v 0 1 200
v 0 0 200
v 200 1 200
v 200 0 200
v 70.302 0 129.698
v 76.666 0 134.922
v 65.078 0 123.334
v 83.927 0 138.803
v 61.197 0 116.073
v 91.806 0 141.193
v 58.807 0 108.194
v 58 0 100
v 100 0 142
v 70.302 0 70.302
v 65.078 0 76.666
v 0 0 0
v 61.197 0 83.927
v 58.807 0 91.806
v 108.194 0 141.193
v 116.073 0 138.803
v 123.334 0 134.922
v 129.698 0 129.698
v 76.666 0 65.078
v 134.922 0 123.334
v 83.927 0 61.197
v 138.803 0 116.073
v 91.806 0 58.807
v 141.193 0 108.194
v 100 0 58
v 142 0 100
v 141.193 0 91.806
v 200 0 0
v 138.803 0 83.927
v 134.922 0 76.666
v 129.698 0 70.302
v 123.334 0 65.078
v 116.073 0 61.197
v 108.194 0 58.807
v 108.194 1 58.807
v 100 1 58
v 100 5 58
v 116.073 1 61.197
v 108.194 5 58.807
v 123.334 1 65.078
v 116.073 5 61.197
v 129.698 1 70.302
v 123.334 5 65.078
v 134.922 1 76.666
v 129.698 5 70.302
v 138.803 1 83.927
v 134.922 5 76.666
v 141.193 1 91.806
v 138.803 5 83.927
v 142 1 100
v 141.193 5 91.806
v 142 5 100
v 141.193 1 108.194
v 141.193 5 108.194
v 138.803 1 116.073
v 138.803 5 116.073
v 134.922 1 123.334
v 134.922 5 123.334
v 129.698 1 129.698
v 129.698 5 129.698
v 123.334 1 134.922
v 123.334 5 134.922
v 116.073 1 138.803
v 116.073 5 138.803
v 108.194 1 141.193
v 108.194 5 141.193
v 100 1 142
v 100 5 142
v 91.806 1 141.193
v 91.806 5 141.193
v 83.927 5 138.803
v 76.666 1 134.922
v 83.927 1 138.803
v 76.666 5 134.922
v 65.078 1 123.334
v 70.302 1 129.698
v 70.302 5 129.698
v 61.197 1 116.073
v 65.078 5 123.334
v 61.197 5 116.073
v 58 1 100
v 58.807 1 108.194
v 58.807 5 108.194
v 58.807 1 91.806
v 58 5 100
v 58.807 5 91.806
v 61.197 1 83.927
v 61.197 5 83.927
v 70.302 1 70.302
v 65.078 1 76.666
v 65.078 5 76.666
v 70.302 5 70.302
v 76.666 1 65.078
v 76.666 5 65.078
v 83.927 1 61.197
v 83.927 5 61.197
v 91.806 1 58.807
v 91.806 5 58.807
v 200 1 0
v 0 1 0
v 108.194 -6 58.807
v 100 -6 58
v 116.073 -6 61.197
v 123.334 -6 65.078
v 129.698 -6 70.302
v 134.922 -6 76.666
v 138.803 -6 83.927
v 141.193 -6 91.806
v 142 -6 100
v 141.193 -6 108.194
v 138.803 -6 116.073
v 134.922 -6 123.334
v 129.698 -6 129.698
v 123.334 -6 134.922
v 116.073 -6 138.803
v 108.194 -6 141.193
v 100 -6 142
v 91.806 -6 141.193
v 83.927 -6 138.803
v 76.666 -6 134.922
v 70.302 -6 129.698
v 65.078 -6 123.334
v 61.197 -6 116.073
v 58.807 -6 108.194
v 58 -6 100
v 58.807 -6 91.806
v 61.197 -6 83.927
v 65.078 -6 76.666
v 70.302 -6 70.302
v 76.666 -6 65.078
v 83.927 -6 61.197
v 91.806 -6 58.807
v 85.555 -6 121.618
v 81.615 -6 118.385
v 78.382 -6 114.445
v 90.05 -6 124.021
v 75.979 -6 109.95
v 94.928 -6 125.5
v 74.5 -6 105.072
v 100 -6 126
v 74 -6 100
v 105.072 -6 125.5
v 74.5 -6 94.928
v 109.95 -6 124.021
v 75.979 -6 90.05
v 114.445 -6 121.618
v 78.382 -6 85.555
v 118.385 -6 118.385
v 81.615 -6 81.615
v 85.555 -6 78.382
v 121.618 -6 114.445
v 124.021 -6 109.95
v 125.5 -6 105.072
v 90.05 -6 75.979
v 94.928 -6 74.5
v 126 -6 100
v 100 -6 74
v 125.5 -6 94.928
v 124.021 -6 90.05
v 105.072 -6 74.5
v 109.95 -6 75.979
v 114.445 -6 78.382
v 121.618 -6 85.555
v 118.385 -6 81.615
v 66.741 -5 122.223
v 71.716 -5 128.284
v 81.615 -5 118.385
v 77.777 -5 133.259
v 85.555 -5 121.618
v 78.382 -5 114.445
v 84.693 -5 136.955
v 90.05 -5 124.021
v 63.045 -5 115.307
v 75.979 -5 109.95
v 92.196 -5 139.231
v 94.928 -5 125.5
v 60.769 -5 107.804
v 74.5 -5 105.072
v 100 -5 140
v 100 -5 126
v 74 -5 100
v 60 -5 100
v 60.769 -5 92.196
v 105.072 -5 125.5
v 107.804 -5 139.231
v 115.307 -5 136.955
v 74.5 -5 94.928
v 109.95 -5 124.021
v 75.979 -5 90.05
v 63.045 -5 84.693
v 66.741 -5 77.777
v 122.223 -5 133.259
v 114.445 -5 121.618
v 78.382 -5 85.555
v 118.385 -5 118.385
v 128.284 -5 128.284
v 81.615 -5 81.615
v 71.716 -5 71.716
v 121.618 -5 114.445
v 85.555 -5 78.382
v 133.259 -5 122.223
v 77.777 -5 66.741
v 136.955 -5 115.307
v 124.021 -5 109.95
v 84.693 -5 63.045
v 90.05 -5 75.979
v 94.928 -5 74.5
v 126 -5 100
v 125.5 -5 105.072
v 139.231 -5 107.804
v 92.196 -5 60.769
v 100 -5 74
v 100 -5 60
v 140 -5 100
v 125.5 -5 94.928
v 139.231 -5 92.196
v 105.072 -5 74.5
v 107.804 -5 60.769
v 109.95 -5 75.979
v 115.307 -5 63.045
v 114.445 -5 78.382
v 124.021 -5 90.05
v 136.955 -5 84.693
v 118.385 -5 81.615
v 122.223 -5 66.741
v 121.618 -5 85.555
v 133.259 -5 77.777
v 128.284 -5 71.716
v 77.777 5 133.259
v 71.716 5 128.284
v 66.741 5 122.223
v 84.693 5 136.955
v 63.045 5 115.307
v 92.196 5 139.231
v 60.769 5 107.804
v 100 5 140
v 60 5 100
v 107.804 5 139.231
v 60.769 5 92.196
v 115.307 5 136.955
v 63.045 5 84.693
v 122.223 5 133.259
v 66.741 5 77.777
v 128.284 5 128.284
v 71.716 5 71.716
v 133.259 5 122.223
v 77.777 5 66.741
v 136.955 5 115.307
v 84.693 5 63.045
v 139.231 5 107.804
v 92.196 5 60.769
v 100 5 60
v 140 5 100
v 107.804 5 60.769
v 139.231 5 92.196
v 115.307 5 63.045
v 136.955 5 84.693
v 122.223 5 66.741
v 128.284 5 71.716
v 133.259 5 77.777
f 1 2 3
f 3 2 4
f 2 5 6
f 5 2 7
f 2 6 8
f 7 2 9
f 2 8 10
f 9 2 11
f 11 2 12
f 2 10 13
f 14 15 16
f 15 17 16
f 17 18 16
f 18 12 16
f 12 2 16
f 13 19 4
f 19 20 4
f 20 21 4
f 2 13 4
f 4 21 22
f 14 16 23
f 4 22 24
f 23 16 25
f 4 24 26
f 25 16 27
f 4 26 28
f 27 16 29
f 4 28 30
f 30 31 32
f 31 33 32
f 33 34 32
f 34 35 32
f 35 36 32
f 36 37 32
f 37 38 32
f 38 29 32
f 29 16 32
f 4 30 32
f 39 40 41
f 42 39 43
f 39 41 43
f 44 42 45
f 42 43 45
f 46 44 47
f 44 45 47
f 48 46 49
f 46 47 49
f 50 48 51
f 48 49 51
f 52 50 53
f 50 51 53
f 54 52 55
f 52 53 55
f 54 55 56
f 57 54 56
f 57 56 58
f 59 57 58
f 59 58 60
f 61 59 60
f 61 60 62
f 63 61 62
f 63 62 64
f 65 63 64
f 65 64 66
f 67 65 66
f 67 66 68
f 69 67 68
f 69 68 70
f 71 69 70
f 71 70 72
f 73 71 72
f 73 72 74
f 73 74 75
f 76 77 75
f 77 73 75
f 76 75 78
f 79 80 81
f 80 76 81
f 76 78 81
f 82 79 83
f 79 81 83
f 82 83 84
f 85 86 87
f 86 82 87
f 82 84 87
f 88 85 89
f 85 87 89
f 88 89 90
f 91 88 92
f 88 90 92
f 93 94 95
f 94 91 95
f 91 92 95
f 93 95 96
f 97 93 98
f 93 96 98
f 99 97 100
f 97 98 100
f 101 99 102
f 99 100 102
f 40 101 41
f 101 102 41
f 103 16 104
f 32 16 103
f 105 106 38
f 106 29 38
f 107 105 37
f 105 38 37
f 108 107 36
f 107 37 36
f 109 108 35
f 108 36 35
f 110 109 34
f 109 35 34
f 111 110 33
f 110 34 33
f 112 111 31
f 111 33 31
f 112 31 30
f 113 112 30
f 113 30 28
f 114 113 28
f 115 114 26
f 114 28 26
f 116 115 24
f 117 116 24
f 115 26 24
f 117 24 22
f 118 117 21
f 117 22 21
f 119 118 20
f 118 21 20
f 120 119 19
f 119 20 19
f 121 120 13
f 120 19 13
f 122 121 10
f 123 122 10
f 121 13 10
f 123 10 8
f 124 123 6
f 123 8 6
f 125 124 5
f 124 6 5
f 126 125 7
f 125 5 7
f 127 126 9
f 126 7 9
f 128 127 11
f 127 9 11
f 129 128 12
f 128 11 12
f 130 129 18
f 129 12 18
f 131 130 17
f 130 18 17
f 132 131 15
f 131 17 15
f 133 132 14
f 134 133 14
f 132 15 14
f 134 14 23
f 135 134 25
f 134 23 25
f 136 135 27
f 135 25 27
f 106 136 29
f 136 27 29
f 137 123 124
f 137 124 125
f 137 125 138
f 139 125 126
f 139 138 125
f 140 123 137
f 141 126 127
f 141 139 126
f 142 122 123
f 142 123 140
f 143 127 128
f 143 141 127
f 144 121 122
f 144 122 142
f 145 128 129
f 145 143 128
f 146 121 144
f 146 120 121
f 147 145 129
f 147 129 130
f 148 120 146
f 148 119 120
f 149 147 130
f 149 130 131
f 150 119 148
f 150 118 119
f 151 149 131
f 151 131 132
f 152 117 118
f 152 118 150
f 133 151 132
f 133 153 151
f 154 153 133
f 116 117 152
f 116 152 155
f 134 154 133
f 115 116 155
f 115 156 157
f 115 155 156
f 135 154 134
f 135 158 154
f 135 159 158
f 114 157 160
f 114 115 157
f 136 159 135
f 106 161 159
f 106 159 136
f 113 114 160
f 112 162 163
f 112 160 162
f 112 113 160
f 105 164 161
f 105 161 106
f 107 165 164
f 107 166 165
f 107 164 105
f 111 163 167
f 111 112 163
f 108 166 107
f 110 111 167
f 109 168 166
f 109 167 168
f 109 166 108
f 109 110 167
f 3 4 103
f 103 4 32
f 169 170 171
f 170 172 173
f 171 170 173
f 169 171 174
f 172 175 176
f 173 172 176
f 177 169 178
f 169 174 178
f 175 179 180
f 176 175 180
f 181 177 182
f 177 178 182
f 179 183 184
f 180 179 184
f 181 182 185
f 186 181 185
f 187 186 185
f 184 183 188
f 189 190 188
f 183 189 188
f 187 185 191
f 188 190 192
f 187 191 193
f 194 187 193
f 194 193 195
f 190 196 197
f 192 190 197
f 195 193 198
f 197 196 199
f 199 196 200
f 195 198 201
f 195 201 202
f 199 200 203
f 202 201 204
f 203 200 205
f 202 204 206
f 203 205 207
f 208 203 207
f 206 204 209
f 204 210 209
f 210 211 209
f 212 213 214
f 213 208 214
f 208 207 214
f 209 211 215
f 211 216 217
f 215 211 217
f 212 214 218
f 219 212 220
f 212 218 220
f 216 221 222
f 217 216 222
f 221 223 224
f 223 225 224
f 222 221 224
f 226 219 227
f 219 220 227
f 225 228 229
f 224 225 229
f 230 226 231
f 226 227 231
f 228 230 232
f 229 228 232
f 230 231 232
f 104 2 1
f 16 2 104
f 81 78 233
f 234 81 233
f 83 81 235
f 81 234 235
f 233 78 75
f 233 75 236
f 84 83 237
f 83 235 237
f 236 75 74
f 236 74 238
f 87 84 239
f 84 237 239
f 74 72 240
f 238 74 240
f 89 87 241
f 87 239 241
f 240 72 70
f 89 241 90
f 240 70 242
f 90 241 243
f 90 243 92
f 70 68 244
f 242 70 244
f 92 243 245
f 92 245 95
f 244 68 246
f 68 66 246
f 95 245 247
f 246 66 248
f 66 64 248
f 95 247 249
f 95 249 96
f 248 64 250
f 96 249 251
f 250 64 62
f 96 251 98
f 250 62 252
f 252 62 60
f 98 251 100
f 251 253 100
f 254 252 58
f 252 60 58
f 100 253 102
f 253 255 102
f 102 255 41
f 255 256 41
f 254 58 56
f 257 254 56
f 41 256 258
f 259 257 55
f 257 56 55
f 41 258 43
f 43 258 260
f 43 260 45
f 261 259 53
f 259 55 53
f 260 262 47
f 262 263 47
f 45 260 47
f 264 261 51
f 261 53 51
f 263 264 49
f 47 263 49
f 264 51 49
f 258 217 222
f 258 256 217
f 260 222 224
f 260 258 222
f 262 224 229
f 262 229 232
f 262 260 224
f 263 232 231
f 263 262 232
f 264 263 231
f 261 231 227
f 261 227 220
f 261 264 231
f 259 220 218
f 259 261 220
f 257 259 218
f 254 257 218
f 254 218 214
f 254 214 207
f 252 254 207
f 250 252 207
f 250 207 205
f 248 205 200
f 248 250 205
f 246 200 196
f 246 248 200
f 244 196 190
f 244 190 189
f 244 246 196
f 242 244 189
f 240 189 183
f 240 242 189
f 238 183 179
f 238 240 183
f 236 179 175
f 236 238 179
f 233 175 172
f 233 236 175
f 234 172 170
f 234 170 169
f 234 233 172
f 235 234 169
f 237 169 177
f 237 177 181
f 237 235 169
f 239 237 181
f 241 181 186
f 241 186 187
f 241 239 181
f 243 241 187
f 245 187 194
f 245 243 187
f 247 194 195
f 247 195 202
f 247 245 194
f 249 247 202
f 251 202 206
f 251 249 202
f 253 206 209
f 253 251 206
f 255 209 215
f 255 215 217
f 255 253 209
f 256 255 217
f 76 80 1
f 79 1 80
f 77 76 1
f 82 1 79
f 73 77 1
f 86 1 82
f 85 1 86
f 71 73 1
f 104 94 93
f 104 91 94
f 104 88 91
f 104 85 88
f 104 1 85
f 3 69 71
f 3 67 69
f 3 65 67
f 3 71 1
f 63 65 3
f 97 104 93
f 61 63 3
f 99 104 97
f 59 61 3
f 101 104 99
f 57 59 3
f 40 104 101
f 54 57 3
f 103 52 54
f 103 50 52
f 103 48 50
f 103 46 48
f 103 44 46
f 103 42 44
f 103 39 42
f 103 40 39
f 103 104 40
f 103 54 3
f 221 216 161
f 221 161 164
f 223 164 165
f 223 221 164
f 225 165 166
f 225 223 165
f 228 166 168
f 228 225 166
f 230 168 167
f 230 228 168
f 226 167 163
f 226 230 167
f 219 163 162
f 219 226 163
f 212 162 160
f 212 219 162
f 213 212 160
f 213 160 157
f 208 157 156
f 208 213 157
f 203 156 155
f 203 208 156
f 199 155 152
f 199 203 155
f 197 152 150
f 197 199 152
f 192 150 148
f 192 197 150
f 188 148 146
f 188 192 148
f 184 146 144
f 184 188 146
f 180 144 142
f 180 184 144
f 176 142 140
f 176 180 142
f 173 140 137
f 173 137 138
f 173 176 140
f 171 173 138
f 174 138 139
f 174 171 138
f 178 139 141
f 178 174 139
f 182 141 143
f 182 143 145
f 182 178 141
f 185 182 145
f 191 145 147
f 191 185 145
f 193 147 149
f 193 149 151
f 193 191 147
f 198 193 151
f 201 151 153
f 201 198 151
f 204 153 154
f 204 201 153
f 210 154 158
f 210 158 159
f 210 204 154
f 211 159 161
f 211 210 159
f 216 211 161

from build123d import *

# Parameters (mm, degrees)
SKETCH1_W                = 200
SKETCH1_H                = 200
BOSS_EXTRUDE3_DEPTH      = 1
SKETCH10_R               = 40
CUT_EXTRUDE2_DEPTH       = 1
BOSS_EXTRUDE6_DEPTH      = 5
BOSS_EXTRUDE6_DEPTH_BACK = 5
SKETCH13_R               = 42
SKETCH13_R_2             = 40
SKETCH14_R               = 42
SKETCH14_R_2             = 26
BOSS_EXTRUDE7_DEPTH      = 1


with BuildPart() as part:
    # Sketch1 → Boss-Extrude3 (new body)
    with BuildSketch(Plane(origin=(0, 0, 0), x_dir=(1, 0, 0), z_dir=(0, 1, 0))):
        with Locations((100, -100)):
            Rectangle(SKETCH1_W, SKETCH1_H)
    extrude(amount=BOSS_EXTRUDE3_DEPTH)

    # Sketch10 → Cut-Extrude2 (cut)
    with BuildSketch(Plane(origin=(0, 1, 0), x_dir=(1, 0, 0), z_dir=(0, 1, 0))):
        with Locations((100, -100)):
            Circle(SKETCH10_R)
    extrude(amount=-CUT_EXTRUDE2_DEPTH, mode=Mode.SUBTRACT)

    # Sketch13 → Boss-Extrude6 (add, two sides: drawn at the far end of the back side and taken through both)
    with BuildSketch(Plane.XZ.offset(-BOSS_EXTRUDE6_DEPTH_BACK)):
        with Locations((100, 100)):
            Circle(SKETCH13_R)
        with Locations((100, 100)):
            Circle(SKETCH13_R_2, mode=Mode.SUBTRACT)
    extrude(amount=BOSS_EXTRUDE6_DEPTH + BOSS_EXTRUDE6_DEPTH_BACK)

    # Sketch14 → Boss-Extrude7 (add)
    with BuildSketch(Plane.XZ.offset(5)):
        with Locations((100, 100)):
            Circle(SKETCH14_R)
        with Locations((100, 100)):
            Circle(SKETCH14_R_2, mode=Mode.SUBTRACT)
    extrude(amount=BOSS_EXTRUDE7_DEPTH)


solid = part.part
